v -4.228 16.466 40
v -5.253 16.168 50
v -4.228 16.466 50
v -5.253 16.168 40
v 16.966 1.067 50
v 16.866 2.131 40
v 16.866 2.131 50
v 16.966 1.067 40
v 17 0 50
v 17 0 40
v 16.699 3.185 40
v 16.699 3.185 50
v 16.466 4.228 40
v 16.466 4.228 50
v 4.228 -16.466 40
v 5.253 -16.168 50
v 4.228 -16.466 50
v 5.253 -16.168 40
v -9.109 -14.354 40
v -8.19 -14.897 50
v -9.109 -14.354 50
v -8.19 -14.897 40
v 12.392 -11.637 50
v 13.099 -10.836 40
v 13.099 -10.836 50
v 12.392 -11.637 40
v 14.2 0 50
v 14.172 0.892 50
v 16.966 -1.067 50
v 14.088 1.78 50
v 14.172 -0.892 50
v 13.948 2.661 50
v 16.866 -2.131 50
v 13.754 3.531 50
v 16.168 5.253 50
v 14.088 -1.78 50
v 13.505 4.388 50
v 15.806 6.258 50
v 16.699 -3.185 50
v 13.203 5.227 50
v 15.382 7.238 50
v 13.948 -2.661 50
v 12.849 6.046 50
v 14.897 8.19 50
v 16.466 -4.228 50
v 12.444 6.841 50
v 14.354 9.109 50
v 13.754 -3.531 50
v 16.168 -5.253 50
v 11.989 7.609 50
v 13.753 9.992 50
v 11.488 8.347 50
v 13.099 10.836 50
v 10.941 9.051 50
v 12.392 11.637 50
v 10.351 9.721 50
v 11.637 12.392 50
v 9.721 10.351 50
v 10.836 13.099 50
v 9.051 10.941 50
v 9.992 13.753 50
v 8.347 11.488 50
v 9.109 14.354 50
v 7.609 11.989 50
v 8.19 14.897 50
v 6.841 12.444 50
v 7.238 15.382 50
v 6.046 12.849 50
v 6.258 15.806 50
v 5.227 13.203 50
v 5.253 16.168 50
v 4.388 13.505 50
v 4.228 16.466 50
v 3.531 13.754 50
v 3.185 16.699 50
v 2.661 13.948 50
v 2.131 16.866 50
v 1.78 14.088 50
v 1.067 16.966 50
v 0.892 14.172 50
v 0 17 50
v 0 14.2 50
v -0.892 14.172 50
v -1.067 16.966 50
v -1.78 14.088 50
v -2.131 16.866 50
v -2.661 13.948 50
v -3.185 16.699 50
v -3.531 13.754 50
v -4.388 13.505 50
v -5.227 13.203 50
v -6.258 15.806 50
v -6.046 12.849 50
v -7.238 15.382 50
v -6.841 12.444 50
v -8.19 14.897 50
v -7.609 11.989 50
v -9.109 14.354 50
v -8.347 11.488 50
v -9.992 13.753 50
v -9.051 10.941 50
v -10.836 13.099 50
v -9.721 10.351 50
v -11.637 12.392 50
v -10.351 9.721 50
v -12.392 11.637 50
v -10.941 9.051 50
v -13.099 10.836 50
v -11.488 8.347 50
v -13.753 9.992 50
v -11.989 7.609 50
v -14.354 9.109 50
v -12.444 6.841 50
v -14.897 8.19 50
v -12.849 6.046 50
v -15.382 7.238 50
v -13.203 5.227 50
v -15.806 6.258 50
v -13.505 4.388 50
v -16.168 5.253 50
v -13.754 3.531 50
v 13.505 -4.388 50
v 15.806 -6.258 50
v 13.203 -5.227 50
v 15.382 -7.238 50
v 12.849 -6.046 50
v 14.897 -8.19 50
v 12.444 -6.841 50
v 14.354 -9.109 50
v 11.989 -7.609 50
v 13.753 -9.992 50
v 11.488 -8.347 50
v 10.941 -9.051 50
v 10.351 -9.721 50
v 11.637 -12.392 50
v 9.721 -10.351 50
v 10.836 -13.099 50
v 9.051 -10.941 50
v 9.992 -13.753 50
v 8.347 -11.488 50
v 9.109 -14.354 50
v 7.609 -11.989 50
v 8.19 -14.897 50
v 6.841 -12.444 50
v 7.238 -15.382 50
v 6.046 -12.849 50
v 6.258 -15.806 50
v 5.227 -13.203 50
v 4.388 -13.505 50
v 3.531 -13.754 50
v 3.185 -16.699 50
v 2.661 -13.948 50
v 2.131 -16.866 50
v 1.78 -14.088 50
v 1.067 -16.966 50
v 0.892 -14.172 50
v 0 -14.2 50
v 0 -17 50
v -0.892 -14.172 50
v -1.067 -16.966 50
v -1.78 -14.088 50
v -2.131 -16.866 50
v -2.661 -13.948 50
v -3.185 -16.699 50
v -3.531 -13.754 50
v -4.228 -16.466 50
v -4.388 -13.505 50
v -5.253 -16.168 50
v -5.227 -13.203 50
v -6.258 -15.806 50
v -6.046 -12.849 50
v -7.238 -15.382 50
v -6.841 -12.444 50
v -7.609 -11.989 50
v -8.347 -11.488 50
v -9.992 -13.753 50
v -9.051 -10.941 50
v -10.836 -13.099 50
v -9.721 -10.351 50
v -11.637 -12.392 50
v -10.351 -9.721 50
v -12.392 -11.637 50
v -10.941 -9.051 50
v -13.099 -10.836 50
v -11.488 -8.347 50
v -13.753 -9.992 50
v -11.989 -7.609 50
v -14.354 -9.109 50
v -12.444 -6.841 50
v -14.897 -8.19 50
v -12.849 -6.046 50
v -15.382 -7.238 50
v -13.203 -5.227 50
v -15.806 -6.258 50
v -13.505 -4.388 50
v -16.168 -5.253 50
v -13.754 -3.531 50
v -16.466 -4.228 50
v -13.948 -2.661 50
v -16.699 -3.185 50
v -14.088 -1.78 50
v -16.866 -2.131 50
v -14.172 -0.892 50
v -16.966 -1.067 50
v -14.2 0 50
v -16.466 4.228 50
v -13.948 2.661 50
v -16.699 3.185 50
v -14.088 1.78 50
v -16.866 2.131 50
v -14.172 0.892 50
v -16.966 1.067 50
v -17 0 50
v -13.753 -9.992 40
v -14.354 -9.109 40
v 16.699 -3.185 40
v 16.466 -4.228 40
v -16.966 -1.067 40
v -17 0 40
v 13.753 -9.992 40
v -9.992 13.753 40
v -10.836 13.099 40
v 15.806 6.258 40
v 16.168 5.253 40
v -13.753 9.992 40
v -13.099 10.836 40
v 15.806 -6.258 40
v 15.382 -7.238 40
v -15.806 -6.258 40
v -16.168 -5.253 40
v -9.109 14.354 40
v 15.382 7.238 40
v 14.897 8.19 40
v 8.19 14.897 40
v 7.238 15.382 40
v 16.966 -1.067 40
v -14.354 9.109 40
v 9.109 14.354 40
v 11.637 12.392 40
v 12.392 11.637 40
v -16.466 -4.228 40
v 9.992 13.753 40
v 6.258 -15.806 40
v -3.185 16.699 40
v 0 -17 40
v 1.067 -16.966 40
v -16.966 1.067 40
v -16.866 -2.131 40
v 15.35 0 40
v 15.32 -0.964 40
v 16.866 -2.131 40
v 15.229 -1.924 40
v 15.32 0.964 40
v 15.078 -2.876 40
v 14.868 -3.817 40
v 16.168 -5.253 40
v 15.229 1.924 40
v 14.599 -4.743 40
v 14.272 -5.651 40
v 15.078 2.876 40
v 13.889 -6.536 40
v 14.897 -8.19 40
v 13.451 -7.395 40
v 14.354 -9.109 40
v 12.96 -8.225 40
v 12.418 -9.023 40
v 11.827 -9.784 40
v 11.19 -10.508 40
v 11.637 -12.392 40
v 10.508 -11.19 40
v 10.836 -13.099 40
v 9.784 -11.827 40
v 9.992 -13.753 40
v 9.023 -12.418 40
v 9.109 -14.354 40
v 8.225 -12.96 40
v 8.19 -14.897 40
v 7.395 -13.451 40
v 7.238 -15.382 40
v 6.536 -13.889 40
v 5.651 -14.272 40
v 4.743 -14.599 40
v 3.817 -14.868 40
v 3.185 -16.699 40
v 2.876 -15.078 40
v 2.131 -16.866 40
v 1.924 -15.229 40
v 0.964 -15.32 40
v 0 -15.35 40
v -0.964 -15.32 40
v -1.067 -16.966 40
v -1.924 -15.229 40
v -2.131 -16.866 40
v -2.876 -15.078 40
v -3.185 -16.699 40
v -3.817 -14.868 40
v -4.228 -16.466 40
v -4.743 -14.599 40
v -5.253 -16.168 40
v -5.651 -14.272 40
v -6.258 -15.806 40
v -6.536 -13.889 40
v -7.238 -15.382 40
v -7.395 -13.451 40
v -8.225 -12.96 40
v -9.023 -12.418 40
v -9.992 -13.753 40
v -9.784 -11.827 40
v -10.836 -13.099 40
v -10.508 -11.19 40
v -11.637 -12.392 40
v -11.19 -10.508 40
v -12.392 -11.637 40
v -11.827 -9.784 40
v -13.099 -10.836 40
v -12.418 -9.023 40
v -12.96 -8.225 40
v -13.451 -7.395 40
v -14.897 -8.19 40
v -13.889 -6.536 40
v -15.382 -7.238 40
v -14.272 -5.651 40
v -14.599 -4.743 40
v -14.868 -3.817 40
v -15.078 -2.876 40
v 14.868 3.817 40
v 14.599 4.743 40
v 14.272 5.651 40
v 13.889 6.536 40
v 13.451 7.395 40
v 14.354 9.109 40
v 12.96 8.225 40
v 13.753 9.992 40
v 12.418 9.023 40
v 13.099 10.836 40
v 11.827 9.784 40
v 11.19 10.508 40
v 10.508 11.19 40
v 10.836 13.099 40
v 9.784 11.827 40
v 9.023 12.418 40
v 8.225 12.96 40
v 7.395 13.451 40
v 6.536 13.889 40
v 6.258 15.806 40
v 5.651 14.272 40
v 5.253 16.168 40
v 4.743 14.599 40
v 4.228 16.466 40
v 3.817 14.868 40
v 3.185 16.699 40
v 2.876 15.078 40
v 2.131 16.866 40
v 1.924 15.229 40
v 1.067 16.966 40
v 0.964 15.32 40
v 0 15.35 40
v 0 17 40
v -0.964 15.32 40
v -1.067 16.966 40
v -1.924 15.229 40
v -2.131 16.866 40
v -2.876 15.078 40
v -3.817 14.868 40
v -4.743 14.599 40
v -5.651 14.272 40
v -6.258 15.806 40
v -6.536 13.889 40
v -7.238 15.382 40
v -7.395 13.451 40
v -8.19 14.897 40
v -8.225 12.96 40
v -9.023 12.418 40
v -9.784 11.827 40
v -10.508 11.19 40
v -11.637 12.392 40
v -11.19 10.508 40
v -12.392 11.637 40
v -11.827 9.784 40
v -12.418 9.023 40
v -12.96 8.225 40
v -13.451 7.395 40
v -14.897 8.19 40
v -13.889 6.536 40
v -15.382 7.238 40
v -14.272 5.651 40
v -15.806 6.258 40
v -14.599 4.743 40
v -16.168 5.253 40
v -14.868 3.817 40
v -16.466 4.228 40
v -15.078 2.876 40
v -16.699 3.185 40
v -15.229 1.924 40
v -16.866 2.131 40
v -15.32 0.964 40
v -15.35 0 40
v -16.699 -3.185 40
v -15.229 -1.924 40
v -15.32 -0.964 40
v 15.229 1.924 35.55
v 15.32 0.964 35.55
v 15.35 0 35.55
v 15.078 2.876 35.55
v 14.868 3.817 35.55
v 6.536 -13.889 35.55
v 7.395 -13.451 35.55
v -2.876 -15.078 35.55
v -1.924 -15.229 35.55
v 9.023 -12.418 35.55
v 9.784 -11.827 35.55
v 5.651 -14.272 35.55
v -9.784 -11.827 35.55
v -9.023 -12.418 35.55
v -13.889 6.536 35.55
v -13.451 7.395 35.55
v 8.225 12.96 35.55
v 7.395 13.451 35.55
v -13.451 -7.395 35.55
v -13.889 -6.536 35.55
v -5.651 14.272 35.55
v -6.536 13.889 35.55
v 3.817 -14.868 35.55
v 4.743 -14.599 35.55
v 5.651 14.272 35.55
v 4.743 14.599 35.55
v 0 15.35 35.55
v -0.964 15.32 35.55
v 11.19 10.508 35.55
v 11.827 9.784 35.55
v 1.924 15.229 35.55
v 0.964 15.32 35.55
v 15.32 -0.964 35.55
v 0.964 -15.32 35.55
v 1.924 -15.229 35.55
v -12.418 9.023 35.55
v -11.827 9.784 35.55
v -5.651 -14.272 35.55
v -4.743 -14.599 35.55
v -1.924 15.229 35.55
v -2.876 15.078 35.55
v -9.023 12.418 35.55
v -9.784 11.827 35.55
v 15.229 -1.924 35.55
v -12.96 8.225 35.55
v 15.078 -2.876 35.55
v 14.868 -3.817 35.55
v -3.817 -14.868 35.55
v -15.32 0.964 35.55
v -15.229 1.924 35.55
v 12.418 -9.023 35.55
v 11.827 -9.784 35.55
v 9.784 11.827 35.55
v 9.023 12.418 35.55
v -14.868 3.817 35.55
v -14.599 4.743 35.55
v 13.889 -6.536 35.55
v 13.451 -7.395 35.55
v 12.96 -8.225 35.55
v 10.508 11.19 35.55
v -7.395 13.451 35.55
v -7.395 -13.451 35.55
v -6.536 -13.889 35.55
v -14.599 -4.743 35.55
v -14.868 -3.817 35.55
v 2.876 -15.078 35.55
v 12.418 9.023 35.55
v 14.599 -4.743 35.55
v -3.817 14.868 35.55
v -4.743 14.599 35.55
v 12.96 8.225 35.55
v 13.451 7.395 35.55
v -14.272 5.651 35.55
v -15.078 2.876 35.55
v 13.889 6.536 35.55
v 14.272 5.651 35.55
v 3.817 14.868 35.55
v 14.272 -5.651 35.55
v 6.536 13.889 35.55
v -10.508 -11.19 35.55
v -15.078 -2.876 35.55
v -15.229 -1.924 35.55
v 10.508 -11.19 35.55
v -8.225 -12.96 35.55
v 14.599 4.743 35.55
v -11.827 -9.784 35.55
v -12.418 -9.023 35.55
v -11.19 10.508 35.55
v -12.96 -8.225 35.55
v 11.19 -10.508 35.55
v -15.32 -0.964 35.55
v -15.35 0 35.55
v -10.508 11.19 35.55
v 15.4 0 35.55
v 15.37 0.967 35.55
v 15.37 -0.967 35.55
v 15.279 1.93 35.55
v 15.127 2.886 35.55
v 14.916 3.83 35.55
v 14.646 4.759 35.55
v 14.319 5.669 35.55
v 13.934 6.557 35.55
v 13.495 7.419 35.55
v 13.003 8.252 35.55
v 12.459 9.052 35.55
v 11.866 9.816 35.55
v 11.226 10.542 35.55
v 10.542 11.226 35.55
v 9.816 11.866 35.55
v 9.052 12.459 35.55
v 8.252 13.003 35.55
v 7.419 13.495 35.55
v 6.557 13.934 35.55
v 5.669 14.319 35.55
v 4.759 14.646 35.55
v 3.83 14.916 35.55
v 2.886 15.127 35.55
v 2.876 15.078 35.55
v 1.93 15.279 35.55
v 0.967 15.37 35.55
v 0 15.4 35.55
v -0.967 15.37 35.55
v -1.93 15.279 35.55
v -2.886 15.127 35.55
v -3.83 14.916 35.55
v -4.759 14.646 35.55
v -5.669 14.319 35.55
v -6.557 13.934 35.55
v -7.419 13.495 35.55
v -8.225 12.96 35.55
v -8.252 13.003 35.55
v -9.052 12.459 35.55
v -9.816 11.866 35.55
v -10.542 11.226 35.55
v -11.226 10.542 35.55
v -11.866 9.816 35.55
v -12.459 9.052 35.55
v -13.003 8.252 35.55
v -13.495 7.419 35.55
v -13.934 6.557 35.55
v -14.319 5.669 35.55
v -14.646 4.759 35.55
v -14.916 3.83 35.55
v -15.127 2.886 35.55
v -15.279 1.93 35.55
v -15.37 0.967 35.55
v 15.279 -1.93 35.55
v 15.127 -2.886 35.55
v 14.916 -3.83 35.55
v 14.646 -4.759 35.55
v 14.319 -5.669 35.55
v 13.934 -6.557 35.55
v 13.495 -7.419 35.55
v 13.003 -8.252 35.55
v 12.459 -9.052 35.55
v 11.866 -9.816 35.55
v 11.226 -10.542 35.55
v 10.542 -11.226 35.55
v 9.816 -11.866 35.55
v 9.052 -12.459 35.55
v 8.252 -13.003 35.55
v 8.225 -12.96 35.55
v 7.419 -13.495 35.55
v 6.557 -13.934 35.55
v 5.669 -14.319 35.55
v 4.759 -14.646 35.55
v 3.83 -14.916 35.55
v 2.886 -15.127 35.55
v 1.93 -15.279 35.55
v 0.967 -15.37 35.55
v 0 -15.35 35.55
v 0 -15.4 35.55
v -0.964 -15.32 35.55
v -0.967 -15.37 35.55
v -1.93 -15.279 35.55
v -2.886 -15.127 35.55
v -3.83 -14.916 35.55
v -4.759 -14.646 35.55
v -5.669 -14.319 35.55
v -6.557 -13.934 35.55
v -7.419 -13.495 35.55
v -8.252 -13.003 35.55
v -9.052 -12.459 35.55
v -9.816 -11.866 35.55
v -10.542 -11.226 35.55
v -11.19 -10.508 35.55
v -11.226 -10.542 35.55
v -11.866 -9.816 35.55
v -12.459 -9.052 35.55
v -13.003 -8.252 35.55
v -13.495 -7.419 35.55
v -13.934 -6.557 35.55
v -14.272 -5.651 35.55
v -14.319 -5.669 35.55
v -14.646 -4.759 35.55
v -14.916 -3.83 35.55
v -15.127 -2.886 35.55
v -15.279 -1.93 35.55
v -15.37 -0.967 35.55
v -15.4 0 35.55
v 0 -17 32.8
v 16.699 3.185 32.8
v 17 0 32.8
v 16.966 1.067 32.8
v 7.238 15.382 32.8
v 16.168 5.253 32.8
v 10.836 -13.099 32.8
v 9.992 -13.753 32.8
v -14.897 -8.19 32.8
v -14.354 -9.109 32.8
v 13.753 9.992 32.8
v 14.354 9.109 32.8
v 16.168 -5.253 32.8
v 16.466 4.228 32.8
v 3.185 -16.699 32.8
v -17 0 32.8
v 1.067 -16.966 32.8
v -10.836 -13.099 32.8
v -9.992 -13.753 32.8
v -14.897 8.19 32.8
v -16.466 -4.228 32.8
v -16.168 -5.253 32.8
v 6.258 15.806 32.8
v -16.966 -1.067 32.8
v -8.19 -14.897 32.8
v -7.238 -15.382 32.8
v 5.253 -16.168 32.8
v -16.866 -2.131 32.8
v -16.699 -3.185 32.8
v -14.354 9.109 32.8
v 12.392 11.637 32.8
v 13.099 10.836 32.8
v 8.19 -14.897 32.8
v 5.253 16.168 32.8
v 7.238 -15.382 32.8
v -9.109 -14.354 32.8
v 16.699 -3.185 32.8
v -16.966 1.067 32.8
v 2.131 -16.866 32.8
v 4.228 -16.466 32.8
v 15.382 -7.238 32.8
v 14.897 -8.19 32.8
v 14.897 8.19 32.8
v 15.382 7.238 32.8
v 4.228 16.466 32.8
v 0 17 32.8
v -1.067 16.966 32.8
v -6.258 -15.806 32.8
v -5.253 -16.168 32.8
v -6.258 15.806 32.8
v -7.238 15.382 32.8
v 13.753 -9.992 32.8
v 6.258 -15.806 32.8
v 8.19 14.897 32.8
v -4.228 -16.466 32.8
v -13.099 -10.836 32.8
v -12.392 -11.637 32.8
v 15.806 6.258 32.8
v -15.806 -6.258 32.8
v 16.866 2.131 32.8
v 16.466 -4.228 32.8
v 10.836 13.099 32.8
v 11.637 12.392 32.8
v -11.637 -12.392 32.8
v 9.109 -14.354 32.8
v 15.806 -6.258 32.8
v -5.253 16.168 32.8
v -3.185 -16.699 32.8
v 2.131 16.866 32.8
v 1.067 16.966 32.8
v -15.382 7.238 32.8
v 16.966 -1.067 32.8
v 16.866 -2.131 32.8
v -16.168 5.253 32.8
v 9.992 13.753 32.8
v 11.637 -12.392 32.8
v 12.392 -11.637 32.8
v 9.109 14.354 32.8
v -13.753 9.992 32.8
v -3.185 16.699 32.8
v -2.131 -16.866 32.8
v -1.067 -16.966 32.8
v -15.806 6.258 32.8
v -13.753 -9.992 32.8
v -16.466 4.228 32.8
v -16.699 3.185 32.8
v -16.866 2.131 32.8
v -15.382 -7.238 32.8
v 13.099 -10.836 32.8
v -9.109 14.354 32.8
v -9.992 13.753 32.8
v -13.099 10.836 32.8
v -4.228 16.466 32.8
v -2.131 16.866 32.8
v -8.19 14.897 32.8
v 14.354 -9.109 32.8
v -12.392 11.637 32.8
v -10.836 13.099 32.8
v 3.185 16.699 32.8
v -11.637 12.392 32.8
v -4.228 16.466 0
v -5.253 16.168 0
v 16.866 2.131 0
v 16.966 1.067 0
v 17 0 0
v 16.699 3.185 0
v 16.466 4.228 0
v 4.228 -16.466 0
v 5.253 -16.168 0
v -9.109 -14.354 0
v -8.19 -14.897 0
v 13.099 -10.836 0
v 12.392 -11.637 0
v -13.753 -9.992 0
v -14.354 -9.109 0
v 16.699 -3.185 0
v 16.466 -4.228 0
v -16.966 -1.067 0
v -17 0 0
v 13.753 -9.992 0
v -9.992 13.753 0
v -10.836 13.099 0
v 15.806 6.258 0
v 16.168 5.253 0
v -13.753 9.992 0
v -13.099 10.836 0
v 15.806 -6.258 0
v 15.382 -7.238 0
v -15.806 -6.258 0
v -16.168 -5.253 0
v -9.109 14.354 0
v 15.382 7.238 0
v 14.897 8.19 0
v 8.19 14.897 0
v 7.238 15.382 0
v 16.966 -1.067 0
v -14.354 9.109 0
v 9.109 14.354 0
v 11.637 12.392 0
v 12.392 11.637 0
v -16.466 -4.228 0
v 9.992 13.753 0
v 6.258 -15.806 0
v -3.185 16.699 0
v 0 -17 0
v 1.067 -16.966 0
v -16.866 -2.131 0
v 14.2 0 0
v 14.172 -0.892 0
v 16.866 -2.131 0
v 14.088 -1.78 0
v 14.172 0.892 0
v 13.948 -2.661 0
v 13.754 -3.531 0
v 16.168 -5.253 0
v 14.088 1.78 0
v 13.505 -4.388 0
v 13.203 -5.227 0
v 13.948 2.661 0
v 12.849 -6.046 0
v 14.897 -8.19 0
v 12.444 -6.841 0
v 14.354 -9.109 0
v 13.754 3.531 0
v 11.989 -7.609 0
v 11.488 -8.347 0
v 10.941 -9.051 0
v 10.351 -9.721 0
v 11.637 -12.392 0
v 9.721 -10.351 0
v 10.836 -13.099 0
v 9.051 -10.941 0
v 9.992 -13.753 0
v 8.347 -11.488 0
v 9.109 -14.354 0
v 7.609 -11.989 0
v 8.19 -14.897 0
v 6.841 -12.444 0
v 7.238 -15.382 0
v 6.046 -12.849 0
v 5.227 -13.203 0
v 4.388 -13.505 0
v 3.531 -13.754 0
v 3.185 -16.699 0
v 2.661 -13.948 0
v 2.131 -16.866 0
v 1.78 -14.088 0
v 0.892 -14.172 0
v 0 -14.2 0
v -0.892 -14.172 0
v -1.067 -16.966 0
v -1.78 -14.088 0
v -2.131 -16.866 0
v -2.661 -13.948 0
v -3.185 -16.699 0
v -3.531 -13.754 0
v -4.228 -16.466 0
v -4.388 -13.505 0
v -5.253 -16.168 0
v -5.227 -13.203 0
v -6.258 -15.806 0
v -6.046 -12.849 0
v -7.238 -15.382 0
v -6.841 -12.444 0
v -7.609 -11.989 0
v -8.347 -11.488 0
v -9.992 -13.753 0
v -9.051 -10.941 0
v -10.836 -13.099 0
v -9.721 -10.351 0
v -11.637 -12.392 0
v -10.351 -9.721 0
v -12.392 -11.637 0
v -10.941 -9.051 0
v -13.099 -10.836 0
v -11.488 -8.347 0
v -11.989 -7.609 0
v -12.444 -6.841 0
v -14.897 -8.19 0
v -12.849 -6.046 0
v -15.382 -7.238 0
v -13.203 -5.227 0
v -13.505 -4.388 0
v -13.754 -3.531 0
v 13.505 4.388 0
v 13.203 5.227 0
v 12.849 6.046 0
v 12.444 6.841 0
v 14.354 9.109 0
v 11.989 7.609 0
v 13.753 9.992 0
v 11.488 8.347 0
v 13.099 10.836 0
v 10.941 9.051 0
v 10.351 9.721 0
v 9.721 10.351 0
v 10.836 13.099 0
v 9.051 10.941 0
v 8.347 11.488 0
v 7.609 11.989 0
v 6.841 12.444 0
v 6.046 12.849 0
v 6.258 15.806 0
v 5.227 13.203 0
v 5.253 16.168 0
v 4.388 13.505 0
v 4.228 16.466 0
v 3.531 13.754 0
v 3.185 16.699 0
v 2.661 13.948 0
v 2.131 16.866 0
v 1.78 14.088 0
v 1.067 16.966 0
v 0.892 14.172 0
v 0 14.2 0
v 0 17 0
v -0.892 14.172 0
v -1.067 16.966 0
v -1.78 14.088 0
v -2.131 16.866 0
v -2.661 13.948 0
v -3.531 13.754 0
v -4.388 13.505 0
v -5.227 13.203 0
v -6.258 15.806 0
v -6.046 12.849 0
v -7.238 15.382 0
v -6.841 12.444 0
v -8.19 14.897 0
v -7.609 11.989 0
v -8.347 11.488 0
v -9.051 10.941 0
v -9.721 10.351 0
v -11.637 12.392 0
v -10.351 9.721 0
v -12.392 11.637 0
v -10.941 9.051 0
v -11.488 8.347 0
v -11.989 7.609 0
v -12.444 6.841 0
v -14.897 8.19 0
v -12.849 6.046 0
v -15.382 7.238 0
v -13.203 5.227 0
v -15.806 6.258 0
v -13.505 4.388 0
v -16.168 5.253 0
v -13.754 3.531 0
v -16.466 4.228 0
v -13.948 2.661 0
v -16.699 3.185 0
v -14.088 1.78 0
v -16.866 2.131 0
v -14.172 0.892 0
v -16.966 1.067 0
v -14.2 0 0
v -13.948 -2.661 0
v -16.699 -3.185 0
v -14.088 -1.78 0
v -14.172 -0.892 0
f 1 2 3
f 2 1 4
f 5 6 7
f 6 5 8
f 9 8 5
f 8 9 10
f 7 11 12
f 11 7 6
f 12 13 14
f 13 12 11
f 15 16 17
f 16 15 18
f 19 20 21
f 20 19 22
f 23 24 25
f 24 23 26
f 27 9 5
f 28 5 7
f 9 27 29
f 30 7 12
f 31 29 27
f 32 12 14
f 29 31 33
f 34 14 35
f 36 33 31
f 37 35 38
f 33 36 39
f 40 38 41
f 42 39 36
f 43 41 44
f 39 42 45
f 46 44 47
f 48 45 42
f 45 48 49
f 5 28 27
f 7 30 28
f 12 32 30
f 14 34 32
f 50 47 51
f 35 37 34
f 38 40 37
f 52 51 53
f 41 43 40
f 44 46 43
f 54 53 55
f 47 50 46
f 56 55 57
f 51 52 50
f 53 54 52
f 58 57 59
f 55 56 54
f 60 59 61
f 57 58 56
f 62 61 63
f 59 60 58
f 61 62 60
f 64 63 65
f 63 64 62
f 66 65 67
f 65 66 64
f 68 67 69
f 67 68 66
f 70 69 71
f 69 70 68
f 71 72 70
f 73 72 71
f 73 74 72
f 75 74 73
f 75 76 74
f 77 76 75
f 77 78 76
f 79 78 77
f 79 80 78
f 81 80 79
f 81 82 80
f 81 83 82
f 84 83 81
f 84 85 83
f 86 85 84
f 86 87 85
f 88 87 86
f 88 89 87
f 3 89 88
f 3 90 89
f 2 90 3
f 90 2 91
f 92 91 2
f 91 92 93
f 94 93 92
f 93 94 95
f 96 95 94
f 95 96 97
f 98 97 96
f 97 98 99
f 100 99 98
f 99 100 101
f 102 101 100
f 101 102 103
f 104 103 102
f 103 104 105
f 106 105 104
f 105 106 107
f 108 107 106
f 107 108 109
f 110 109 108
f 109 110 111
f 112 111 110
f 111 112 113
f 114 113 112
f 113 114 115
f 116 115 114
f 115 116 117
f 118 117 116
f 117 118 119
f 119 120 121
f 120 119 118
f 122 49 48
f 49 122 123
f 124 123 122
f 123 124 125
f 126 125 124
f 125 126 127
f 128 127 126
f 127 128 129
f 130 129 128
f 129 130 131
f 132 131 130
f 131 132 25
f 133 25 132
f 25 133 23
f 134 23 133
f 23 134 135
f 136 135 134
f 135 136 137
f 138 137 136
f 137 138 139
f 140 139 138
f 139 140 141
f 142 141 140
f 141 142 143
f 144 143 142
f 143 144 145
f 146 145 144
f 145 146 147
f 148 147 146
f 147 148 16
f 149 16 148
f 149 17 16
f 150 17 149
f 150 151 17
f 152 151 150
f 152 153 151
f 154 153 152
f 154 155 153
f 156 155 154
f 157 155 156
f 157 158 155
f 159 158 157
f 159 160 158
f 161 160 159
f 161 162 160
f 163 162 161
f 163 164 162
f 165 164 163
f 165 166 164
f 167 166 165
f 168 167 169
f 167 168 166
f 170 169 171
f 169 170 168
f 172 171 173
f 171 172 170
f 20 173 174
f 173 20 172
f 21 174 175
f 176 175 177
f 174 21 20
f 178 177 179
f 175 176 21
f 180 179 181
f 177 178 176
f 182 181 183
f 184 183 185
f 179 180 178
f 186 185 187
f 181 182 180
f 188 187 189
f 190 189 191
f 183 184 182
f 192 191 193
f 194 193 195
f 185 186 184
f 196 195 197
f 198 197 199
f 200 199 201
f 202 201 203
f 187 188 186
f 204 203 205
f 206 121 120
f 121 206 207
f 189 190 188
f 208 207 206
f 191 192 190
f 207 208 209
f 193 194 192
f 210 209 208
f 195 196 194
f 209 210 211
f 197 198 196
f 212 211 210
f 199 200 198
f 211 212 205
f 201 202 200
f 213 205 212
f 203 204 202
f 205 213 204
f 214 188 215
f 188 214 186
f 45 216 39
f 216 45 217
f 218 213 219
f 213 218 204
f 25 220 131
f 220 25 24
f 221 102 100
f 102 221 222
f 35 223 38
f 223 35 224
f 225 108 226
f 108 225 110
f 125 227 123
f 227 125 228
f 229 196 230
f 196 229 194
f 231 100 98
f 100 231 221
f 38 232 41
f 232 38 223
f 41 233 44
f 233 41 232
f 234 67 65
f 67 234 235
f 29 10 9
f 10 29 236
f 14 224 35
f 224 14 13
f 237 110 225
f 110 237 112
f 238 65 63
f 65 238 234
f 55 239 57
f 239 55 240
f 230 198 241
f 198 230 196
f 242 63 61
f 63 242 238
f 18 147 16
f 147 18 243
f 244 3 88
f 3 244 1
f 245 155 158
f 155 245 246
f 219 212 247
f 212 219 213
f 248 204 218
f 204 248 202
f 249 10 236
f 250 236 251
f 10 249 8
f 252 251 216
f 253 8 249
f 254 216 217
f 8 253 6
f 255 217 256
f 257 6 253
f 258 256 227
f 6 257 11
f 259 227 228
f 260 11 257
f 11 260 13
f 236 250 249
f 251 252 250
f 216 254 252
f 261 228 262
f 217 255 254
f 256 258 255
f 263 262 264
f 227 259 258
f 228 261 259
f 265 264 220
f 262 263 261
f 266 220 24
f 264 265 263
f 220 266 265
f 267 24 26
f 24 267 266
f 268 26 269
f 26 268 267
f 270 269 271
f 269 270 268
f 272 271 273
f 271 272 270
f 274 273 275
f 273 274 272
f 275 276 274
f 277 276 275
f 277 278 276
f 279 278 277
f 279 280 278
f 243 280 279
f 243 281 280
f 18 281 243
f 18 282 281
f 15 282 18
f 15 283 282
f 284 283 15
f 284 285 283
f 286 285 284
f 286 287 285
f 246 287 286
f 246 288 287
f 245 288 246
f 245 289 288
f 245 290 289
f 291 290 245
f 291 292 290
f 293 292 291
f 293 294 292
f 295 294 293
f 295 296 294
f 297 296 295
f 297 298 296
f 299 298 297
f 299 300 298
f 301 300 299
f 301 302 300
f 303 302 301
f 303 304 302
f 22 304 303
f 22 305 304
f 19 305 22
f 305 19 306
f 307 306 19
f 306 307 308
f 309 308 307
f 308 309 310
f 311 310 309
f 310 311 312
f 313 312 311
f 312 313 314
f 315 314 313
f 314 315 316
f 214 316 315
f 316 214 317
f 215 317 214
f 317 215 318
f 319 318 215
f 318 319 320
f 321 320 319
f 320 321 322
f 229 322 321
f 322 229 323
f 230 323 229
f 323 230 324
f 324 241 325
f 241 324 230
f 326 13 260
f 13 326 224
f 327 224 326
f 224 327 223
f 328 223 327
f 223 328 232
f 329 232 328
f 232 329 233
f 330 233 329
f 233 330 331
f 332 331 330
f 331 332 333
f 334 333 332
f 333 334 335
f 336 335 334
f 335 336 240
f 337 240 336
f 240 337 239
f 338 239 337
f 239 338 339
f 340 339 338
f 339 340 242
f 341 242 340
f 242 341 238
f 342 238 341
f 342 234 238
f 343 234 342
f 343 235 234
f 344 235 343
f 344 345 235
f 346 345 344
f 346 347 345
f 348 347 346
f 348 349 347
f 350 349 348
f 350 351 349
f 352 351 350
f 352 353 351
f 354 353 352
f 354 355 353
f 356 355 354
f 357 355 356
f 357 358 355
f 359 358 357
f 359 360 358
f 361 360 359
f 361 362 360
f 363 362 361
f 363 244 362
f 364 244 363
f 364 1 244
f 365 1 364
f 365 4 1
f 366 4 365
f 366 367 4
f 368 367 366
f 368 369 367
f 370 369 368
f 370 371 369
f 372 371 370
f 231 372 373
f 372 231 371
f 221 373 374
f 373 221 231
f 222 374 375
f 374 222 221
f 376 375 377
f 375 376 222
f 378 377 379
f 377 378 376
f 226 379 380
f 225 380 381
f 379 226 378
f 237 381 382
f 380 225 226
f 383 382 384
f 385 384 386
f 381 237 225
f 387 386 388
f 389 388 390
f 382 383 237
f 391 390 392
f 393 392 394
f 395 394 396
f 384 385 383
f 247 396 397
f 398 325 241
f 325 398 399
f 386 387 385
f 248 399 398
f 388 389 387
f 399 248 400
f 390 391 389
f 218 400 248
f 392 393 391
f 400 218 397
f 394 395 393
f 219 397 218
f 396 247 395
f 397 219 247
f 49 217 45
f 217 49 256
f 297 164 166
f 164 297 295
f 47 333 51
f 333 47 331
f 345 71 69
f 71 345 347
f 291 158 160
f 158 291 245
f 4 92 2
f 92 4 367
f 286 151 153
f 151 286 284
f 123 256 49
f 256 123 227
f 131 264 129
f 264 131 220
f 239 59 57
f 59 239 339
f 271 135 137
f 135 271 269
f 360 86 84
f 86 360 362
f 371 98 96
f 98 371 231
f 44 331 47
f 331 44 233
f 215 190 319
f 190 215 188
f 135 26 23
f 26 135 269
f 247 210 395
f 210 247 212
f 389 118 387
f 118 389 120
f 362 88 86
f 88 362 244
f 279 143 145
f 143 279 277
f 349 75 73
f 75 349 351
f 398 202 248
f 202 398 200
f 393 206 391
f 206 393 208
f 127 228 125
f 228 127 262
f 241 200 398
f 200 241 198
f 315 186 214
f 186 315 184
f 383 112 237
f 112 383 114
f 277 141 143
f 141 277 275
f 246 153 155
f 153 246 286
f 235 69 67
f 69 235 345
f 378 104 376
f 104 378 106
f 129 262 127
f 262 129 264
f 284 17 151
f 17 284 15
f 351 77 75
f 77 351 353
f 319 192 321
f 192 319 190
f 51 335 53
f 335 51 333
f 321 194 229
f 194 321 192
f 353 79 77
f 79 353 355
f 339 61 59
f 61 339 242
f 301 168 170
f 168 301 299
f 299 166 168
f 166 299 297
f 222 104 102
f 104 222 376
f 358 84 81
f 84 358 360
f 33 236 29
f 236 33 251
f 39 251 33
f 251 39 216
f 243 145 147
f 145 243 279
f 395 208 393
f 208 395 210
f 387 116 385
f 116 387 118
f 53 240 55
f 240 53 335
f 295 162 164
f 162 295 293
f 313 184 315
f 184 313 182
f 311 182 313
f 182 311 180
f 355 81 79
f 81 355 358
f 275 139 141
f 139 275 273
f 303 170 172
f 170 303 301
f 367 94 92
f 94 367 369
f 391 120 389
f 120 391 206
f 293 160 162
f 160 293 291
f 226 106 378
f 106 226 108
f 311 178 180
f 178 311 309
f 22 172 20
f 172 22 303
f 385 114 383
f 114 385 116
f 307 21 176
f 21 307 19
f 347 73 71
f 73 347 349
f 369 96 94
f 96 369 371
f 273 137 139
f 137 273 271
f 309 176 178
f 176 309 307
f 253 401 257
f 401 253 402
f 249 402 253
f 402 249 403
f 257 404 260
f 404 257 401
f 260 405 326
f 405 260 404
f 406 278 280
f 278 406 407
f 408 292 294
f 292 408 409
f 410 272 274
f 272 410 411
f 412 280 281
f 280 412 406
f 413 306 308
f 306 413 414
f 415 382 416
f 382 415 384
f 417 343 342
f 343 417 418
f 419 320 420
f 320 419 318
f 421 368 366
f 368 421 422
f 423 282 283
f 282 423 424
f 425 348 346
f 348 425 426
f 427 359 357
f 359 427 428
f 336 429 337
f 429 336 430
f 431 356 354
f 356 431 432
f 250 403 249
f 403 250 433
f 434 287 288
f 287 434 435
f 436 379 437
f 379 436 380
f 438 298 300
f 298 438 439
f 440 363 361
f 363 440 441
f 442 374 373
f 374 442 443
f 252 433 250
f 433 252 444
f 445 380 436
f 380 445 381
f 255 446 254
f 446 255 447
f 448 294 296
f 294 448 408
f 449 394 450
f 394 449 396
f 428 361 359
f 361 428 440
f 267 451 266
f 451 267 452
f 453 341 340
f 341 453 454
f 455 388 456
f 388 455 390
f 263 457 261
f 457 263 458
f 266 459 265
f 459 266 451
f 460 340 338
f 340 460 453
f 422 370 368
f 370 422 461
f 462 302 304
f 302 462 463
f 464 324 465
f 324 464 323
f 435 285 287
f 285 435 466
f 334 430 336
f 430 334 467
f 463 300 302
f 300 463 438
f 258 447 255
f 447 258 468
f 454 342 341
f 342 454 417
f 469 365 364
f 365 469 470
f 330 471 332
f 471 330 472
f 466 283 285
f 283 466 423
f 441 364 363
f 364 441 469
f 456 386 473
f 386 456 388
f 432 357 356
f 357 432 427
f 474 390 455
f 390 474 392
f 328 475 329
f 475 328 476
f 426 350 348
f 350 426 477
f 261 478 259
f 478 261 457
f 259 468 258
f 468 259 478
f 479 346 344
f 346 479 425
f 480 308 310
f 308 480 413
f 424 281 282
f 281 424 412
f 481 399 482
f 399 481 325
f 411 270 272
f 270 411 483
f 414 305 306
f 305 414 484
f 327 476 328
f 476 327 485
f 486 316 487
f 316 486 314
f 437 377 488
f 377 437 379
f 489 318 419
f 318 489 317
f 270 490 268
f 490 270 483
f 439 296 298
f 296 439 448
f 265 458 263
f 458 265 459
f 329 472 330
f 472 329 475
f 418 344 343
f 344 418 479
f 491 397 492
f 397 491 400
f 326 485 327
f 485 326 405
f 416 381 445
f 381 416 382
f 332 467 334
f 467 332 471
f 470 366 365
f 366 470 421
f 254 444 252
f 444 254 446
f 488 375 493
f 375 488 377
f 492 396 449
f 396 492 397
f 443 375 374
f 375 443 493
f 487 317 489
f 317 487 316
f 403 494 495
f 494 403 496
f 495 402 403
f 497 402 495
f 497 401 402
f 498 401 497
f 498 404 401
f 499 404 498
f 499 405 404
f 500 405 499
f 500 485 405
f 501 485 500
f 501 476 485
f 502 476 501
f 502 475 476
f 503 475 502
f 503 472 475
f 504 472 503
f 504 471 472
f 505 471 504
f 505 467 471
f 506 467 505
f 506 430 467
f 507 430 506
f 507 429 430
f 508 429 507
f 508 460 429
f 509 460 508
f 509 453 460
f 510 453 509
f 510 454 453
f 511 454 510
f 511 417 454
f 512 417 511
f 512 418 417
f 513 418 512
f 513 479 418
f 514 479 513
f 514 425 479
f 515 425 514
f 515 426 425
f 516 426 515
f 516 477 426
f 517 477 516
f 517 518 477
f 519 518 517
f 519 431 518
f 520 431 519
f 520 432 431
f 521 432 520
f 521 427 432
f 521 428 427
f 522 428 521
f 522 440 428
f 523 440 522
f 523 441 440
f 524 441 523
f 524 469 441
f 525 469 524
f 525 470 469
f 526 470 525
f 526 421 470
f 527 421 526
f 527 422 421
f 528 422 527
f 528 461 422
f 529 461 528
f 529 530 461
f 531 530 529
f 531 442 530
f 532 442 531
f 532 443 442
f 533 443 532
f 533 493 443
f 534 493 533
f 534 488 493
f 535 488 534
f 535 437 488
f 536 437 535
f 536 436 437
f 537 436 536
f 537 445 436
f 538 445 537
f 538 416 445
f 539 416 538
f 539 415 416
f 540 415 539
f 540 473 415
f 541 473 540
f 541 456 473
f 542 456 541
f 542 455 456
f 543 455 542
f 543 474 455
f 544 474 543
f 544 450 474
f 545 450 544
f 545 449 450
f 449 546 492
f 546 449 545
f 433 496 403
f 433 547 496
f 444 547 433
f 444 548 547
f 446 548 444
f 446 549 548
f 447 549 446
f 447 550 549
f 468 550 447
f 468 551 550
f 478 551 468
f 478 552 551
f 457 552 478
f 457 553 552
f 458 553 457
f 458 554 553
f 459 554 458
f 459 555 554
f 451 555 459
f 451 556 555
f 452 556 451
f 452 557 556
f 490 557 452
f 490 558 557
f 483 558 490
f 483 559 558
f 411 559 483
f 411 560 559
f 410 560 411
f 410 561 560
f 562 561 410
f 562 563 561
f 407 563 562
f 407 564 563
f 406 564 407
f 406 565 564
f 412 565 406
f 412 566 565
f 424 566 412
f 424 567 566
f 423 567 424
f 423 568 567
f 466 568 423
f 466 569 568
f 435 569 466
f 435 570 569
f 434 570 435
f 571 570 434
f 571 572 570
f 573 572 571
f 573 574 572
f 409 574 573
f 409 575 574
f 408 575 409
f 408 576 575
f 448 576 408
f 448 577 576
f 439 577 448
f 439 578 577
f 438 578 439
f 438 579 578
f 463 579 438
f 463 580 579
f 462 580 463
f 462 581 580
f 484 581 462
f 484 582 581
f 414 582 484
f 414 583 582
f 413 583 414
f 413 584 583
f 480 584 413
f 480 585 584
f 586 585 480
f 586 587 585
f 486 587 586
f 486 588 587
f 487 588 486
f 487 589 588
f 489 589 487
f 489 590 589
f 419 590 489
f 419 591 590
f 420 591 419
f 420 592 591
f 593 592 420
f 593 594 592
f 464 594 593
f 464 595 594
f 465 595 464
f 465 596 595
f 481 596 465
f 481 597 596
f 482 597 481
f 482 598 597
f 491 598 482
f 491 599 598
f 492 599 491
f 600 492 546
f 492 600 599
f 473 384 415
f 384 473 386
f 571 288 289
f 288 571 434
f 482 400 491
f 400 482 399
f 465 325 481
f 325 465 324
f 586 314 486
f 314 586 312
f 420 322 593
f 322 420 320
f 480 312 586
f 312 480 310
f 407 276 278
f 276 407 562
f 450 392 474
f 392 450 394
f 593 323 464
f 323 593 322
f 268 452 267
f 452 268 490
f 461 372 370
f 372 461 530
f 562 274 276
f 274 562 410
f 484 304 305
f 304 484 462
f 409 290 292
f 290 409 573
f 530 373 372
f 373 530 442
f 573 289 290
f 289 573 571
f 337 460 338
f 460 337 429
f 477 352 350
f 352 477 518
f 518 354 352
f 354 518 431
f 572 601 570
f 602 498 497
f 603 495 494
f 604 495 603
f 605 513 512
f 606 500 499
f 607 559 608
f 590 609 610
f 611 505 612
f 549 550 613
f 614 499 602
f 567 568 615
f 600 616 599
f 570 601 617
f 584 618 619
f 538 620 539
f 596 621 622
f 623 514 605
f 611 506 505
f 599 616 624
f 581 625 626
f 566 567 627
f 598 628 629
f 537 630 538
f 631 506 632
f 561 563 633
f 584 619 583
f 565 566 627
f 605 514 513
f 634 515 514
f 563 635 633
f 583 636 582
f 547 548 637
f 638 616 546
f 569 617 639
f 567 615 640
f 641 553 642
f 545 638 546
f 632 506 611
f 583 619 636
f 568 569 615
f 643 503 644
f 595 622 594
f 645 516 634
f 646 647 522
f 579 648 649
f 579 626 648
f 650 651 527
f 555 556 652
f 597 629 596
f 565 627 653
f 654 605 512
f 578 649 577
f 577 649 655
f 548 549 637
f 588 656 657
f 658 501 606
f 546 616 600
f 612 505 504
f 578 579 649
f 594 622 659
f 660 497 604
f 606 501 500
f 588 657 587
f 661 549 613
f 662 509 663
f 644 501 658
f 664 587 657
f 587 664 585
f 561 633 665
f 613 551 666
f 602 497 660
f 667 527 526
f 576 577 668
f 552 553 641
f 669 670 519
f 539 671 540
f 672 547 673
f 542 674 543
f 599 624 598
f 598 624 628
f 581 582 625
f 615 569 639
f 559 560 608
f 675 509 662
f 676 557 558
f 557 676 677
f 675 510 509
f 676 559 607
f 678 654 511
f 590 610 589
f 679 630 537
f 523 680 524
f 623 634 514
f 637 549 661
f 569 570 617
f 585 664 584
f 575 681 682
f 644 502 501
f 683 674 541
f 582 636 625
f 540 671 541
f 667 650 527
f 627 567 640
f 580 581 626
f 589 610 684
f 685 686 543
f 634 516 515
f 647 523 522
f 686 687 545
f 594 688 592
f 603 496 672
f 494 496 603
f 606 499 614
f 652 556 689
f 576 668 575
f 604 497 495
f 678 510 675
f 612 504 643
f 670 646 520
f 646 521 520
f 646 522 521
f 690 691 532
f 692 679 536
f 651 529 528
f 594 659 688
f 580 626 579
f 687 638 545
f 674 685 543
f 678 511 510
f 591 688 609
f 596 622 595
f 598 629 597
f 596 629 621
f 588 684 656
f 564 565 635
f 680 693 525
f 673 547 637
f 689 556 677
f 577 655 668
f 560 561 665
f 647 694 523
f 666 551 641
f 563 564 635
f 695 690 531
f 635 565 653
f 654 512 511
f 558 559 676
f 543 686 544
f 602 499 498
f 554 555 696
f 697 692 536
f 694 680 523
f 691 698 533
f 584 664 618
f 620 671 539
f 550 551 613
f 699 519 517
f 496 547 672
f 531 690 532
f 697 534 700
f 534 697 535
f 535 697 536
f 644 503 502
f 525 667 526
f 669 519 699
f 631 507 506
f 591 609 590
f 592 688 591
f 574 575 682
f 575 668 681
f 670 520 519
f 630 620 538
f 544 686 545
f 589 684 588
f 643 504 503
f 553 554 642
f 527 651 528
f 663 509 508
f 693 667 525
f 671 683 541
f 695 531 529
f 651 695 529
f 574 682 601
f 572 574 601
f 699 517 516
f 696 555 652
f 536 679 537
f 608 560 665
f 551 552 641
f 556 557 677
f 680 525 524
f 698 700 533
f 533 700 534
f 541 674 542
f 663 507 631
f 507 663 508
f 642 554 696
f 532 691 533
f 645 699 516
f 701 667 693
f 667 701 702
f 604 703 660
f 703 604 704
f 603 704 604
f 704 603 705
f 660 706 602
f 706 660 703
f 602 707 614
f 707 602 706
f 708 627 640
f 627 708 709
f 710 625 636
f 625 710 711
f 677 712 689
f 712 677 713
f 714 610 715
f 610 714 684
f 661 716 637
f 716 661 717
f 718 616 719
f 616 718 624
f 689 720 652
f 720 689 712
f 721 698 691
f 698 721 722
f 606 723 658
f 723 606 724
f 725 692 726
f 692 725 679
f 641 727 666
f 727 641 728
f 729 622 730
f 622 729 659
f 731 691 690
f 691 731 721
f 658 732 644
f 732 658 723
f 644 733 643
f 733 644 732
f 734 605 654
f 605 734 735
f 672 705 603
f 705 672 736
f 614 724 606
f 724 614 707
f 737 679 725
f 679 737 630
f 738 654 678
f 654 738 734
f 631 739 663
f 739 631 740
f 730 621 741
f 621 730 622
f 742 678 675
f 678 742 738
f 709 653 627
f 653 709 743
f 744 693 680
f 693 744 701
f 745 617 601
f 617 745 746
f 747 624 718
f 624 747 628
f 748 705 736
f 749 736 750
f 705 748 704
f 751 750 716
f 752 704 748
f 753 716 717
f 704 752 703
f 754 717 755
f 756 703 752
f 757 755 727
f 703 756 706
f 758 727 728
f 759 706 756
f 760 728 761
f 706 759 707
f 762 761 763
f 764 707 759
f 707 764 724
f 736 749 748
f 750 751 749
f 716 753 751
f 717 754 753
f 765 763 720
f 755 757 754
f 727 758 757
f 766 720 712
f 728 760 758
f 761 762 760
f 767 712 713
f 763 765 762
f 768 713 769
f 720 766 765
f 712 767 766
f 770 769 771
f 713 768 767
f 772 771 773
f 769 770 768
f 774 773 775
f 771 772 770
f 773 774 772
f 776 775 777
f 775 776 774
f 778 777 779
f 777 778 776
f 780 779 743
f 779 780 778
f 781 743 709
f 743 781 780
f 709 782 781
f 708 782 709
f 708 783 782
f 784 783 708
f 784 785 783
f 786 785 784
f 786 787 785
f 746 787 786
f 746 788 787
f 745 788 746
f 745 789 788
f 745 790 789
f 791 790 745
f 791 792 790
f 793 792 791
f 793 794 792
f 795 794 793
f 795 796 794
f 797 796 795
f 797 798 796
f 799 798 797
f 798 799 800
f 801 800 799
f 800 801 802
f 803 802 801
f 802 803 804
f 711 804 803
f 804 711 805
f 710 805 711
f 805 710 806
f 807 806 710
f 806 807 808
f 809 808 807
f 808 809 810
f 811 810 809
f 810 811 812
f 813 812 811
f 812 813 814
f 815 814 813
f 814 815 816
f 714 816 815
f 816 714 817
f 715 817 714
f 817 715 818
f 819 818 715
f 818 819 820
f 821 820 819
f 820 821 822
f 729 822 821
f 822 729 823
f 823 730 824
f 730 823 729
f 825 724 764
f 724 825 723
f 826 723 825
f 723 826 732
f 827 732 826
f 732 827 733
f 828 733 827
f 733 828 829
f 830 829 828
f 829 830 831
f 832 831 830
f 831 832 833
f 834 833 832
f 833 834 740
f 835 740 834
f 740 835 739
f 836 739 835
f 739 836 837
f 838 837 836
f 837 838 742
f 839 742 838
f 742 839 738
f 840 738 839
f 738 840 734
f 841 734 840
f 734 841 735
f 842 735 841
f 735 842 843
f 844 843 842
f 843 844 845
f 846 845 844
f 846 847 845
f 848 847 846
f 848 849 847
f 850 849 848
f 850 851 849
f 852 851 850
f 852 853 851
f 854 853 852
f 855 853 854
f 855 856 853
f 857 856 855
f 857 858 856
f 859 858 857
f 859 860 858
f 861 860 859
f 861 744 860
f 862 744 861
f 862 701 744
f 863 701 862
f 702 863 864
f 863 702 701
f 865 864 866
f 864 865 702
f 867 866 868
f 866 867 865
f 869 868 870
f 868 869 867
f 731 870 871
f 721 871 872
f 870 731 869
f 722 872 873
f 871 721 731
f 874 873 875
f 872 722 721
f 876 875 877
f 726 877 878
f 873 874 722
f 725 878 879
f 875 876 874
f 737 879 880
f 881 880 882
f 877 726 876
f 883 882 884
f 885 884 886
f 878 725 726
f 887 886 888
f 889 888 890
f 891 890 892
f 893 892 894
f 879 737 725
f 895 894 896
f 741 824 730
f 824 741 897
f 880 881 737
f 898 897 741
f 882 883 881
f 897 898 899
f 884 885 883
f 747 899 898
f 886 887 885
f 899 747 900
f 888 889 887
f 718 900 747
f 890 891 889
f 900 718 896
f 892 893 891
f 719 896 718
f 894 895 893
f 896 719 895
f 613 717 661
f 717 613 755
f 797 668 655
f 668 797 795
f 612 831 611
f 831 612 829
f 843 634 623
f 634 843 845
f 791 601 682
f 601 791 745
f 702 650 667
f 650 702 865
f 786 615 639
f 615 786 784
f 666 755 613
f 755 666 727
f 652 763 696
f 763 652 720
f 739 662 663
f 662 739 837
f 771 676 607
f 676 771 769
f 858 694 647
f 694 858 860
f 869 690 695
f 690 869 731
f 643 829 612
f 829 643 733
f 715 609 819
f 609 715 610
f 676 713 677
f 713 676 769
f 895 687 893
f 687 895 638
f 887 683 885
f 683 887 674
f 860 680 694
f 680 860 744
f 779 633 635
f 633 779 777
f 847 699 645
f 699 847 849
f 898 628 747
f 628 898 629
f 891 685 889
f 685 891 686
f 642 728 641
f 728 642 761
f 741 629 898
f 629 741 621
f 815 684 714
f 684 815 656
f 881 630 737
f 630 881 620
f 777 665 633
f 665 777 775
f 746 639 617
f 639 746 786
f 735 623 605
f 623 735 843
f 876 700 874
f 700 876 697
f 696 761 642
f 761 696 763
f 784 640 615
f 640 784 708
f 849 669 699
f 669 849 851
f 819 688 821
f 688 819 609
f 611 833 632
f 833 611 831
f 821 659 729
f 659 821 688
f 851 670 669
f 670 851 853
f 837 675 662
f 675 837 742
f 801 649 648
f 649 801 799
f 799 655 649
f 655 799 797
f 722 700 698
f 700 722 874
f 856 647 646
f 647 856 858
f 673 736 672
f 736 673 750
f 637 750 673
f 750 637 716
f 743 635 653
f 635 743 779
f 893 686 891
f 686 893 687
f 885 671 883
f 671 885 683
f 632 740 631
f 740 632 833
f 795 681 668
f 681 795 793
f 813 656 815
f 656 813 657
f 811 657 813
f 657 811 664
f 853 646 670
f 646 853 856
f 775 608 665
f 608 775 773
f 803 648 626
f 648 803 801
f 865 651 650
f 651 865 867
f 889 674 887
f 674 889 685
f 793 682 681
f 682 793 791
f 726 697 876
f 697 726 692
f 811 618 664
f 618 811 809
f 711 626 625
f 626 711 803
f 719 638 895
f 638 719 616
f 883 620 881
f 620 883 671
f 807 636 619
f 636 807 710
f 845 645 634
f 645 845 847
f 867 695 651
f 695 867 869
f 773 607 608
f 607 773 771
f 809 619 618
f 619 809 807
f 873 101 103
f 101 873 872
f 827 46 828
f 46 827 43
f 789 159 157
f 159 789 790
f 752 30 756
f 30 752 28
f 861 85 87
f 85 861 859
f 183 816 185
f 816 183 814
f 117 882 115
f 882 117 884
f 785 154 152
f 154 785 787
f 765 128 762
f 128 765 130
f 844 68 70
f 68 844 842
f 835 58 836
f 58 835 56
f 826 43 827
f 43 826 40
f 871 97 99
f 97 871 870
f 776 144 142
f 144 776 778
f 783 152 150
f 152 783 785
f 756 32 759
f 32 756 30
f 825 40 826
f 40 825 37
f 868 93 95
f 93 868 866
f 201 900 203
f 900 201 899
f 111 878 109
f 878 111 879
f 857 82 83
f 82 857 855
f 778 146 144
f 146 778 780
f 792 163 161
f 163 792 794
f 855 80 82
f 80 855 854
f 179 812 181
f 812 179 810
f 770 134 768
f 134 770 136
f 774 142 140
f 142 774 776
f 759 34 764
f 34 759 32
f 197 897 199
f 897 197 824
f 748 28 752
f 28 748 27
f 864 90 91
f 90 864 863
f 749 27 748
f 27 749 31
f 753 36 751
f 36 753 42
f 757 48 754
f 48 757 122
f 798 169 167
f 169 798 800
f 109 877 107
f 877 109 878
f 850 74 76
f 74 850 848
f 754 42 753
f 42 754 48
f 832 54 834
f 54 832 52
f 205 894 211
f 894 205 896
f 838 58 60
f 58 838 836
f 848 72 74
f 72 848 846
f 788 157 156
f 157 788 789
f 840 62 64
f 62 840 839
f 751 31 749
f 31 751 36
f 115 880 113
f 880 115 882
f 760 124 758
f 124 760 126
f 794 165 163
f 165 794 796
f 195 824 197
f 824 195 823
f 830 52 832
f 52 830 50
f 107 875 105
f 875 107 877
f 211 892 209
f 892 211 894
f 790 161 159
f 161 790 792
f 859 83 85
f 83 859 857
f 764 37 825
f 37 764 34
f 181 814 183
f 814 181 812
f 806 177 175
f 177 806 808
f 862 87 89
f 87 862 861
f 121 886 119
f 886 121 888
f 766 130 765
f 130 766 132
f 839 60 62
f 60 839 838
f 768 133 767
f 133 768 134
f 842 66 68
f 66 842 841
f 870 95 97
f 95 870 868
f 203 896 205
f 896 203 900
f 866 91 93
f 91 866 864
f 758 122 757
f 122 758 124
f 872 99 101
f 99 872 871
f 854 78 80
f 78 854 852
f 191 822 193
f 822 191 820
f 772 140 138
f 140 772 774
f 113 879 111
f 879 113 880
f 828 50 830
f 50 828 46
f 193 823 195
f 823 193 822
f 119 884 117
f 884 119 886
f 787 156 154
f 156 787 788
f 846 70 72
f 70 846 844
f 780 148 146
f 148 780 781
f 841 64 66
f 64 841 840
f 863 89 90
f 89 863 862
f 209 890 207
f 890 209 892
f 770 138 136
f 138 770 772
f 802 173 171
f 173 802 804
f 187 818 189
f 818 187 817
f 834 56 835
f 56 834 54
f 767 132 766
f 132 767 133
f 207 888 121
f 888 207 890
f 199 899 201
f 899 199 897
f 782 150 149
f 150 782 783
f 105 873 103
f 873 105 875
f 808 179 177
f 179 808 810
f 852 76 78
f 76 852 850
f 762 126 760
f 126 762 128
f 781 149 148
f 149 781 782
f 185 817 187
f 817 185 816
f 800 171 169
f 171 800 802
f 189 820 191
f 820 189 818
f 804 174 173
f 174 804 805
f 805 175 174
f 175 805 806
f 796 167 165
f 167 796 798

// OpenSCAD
/*
This file contains the Dyson mouthpiece. I've made it like a function so it can easily be used inside other projects. 
*/
module DysonMouthpiece(){
	DiaTubeOuter = 34;
	DiaTubeInner = 28.4;
	Dia = 30.7;
	HeightShaft = 10;
	HeightInner = 4.45;
	HeightTapper = 2.75;
	HeightTotal = 50;
    HeightShaft2 = HeightTotal - HeightShaft - HeightInner - HeightTapper;
	$fn = 100;

	difference(){
		union(){
			translate([0,0,(HeightShaft/2+HeightInner+HeightTapper+HeightShaft2)])cylinder(d=DiaTubeOuter, h=HeightShaft, center=true);
			color("red")translate([0,0,(HeightShaft2+HeightTapper+HeightInner/2)])cylinder(d=Dia, h=HeightInner, center=true);
			color("green")translate([0,0,(HeightTapper/2+HeightShaft2)])cylinder(d2=Dia+.1, d1=DiaTubeOuter, h=HeightTapper, center=true);
			color("purple")translate([0,0,HeightShaft2/2])cylinder(d=DiaTubeOuter, h=HeightShaft2, center=true);
		}
		cylinder(d=DiaTubeInner, h=150, center=true);
	}
}

DysonMouthpiece();
